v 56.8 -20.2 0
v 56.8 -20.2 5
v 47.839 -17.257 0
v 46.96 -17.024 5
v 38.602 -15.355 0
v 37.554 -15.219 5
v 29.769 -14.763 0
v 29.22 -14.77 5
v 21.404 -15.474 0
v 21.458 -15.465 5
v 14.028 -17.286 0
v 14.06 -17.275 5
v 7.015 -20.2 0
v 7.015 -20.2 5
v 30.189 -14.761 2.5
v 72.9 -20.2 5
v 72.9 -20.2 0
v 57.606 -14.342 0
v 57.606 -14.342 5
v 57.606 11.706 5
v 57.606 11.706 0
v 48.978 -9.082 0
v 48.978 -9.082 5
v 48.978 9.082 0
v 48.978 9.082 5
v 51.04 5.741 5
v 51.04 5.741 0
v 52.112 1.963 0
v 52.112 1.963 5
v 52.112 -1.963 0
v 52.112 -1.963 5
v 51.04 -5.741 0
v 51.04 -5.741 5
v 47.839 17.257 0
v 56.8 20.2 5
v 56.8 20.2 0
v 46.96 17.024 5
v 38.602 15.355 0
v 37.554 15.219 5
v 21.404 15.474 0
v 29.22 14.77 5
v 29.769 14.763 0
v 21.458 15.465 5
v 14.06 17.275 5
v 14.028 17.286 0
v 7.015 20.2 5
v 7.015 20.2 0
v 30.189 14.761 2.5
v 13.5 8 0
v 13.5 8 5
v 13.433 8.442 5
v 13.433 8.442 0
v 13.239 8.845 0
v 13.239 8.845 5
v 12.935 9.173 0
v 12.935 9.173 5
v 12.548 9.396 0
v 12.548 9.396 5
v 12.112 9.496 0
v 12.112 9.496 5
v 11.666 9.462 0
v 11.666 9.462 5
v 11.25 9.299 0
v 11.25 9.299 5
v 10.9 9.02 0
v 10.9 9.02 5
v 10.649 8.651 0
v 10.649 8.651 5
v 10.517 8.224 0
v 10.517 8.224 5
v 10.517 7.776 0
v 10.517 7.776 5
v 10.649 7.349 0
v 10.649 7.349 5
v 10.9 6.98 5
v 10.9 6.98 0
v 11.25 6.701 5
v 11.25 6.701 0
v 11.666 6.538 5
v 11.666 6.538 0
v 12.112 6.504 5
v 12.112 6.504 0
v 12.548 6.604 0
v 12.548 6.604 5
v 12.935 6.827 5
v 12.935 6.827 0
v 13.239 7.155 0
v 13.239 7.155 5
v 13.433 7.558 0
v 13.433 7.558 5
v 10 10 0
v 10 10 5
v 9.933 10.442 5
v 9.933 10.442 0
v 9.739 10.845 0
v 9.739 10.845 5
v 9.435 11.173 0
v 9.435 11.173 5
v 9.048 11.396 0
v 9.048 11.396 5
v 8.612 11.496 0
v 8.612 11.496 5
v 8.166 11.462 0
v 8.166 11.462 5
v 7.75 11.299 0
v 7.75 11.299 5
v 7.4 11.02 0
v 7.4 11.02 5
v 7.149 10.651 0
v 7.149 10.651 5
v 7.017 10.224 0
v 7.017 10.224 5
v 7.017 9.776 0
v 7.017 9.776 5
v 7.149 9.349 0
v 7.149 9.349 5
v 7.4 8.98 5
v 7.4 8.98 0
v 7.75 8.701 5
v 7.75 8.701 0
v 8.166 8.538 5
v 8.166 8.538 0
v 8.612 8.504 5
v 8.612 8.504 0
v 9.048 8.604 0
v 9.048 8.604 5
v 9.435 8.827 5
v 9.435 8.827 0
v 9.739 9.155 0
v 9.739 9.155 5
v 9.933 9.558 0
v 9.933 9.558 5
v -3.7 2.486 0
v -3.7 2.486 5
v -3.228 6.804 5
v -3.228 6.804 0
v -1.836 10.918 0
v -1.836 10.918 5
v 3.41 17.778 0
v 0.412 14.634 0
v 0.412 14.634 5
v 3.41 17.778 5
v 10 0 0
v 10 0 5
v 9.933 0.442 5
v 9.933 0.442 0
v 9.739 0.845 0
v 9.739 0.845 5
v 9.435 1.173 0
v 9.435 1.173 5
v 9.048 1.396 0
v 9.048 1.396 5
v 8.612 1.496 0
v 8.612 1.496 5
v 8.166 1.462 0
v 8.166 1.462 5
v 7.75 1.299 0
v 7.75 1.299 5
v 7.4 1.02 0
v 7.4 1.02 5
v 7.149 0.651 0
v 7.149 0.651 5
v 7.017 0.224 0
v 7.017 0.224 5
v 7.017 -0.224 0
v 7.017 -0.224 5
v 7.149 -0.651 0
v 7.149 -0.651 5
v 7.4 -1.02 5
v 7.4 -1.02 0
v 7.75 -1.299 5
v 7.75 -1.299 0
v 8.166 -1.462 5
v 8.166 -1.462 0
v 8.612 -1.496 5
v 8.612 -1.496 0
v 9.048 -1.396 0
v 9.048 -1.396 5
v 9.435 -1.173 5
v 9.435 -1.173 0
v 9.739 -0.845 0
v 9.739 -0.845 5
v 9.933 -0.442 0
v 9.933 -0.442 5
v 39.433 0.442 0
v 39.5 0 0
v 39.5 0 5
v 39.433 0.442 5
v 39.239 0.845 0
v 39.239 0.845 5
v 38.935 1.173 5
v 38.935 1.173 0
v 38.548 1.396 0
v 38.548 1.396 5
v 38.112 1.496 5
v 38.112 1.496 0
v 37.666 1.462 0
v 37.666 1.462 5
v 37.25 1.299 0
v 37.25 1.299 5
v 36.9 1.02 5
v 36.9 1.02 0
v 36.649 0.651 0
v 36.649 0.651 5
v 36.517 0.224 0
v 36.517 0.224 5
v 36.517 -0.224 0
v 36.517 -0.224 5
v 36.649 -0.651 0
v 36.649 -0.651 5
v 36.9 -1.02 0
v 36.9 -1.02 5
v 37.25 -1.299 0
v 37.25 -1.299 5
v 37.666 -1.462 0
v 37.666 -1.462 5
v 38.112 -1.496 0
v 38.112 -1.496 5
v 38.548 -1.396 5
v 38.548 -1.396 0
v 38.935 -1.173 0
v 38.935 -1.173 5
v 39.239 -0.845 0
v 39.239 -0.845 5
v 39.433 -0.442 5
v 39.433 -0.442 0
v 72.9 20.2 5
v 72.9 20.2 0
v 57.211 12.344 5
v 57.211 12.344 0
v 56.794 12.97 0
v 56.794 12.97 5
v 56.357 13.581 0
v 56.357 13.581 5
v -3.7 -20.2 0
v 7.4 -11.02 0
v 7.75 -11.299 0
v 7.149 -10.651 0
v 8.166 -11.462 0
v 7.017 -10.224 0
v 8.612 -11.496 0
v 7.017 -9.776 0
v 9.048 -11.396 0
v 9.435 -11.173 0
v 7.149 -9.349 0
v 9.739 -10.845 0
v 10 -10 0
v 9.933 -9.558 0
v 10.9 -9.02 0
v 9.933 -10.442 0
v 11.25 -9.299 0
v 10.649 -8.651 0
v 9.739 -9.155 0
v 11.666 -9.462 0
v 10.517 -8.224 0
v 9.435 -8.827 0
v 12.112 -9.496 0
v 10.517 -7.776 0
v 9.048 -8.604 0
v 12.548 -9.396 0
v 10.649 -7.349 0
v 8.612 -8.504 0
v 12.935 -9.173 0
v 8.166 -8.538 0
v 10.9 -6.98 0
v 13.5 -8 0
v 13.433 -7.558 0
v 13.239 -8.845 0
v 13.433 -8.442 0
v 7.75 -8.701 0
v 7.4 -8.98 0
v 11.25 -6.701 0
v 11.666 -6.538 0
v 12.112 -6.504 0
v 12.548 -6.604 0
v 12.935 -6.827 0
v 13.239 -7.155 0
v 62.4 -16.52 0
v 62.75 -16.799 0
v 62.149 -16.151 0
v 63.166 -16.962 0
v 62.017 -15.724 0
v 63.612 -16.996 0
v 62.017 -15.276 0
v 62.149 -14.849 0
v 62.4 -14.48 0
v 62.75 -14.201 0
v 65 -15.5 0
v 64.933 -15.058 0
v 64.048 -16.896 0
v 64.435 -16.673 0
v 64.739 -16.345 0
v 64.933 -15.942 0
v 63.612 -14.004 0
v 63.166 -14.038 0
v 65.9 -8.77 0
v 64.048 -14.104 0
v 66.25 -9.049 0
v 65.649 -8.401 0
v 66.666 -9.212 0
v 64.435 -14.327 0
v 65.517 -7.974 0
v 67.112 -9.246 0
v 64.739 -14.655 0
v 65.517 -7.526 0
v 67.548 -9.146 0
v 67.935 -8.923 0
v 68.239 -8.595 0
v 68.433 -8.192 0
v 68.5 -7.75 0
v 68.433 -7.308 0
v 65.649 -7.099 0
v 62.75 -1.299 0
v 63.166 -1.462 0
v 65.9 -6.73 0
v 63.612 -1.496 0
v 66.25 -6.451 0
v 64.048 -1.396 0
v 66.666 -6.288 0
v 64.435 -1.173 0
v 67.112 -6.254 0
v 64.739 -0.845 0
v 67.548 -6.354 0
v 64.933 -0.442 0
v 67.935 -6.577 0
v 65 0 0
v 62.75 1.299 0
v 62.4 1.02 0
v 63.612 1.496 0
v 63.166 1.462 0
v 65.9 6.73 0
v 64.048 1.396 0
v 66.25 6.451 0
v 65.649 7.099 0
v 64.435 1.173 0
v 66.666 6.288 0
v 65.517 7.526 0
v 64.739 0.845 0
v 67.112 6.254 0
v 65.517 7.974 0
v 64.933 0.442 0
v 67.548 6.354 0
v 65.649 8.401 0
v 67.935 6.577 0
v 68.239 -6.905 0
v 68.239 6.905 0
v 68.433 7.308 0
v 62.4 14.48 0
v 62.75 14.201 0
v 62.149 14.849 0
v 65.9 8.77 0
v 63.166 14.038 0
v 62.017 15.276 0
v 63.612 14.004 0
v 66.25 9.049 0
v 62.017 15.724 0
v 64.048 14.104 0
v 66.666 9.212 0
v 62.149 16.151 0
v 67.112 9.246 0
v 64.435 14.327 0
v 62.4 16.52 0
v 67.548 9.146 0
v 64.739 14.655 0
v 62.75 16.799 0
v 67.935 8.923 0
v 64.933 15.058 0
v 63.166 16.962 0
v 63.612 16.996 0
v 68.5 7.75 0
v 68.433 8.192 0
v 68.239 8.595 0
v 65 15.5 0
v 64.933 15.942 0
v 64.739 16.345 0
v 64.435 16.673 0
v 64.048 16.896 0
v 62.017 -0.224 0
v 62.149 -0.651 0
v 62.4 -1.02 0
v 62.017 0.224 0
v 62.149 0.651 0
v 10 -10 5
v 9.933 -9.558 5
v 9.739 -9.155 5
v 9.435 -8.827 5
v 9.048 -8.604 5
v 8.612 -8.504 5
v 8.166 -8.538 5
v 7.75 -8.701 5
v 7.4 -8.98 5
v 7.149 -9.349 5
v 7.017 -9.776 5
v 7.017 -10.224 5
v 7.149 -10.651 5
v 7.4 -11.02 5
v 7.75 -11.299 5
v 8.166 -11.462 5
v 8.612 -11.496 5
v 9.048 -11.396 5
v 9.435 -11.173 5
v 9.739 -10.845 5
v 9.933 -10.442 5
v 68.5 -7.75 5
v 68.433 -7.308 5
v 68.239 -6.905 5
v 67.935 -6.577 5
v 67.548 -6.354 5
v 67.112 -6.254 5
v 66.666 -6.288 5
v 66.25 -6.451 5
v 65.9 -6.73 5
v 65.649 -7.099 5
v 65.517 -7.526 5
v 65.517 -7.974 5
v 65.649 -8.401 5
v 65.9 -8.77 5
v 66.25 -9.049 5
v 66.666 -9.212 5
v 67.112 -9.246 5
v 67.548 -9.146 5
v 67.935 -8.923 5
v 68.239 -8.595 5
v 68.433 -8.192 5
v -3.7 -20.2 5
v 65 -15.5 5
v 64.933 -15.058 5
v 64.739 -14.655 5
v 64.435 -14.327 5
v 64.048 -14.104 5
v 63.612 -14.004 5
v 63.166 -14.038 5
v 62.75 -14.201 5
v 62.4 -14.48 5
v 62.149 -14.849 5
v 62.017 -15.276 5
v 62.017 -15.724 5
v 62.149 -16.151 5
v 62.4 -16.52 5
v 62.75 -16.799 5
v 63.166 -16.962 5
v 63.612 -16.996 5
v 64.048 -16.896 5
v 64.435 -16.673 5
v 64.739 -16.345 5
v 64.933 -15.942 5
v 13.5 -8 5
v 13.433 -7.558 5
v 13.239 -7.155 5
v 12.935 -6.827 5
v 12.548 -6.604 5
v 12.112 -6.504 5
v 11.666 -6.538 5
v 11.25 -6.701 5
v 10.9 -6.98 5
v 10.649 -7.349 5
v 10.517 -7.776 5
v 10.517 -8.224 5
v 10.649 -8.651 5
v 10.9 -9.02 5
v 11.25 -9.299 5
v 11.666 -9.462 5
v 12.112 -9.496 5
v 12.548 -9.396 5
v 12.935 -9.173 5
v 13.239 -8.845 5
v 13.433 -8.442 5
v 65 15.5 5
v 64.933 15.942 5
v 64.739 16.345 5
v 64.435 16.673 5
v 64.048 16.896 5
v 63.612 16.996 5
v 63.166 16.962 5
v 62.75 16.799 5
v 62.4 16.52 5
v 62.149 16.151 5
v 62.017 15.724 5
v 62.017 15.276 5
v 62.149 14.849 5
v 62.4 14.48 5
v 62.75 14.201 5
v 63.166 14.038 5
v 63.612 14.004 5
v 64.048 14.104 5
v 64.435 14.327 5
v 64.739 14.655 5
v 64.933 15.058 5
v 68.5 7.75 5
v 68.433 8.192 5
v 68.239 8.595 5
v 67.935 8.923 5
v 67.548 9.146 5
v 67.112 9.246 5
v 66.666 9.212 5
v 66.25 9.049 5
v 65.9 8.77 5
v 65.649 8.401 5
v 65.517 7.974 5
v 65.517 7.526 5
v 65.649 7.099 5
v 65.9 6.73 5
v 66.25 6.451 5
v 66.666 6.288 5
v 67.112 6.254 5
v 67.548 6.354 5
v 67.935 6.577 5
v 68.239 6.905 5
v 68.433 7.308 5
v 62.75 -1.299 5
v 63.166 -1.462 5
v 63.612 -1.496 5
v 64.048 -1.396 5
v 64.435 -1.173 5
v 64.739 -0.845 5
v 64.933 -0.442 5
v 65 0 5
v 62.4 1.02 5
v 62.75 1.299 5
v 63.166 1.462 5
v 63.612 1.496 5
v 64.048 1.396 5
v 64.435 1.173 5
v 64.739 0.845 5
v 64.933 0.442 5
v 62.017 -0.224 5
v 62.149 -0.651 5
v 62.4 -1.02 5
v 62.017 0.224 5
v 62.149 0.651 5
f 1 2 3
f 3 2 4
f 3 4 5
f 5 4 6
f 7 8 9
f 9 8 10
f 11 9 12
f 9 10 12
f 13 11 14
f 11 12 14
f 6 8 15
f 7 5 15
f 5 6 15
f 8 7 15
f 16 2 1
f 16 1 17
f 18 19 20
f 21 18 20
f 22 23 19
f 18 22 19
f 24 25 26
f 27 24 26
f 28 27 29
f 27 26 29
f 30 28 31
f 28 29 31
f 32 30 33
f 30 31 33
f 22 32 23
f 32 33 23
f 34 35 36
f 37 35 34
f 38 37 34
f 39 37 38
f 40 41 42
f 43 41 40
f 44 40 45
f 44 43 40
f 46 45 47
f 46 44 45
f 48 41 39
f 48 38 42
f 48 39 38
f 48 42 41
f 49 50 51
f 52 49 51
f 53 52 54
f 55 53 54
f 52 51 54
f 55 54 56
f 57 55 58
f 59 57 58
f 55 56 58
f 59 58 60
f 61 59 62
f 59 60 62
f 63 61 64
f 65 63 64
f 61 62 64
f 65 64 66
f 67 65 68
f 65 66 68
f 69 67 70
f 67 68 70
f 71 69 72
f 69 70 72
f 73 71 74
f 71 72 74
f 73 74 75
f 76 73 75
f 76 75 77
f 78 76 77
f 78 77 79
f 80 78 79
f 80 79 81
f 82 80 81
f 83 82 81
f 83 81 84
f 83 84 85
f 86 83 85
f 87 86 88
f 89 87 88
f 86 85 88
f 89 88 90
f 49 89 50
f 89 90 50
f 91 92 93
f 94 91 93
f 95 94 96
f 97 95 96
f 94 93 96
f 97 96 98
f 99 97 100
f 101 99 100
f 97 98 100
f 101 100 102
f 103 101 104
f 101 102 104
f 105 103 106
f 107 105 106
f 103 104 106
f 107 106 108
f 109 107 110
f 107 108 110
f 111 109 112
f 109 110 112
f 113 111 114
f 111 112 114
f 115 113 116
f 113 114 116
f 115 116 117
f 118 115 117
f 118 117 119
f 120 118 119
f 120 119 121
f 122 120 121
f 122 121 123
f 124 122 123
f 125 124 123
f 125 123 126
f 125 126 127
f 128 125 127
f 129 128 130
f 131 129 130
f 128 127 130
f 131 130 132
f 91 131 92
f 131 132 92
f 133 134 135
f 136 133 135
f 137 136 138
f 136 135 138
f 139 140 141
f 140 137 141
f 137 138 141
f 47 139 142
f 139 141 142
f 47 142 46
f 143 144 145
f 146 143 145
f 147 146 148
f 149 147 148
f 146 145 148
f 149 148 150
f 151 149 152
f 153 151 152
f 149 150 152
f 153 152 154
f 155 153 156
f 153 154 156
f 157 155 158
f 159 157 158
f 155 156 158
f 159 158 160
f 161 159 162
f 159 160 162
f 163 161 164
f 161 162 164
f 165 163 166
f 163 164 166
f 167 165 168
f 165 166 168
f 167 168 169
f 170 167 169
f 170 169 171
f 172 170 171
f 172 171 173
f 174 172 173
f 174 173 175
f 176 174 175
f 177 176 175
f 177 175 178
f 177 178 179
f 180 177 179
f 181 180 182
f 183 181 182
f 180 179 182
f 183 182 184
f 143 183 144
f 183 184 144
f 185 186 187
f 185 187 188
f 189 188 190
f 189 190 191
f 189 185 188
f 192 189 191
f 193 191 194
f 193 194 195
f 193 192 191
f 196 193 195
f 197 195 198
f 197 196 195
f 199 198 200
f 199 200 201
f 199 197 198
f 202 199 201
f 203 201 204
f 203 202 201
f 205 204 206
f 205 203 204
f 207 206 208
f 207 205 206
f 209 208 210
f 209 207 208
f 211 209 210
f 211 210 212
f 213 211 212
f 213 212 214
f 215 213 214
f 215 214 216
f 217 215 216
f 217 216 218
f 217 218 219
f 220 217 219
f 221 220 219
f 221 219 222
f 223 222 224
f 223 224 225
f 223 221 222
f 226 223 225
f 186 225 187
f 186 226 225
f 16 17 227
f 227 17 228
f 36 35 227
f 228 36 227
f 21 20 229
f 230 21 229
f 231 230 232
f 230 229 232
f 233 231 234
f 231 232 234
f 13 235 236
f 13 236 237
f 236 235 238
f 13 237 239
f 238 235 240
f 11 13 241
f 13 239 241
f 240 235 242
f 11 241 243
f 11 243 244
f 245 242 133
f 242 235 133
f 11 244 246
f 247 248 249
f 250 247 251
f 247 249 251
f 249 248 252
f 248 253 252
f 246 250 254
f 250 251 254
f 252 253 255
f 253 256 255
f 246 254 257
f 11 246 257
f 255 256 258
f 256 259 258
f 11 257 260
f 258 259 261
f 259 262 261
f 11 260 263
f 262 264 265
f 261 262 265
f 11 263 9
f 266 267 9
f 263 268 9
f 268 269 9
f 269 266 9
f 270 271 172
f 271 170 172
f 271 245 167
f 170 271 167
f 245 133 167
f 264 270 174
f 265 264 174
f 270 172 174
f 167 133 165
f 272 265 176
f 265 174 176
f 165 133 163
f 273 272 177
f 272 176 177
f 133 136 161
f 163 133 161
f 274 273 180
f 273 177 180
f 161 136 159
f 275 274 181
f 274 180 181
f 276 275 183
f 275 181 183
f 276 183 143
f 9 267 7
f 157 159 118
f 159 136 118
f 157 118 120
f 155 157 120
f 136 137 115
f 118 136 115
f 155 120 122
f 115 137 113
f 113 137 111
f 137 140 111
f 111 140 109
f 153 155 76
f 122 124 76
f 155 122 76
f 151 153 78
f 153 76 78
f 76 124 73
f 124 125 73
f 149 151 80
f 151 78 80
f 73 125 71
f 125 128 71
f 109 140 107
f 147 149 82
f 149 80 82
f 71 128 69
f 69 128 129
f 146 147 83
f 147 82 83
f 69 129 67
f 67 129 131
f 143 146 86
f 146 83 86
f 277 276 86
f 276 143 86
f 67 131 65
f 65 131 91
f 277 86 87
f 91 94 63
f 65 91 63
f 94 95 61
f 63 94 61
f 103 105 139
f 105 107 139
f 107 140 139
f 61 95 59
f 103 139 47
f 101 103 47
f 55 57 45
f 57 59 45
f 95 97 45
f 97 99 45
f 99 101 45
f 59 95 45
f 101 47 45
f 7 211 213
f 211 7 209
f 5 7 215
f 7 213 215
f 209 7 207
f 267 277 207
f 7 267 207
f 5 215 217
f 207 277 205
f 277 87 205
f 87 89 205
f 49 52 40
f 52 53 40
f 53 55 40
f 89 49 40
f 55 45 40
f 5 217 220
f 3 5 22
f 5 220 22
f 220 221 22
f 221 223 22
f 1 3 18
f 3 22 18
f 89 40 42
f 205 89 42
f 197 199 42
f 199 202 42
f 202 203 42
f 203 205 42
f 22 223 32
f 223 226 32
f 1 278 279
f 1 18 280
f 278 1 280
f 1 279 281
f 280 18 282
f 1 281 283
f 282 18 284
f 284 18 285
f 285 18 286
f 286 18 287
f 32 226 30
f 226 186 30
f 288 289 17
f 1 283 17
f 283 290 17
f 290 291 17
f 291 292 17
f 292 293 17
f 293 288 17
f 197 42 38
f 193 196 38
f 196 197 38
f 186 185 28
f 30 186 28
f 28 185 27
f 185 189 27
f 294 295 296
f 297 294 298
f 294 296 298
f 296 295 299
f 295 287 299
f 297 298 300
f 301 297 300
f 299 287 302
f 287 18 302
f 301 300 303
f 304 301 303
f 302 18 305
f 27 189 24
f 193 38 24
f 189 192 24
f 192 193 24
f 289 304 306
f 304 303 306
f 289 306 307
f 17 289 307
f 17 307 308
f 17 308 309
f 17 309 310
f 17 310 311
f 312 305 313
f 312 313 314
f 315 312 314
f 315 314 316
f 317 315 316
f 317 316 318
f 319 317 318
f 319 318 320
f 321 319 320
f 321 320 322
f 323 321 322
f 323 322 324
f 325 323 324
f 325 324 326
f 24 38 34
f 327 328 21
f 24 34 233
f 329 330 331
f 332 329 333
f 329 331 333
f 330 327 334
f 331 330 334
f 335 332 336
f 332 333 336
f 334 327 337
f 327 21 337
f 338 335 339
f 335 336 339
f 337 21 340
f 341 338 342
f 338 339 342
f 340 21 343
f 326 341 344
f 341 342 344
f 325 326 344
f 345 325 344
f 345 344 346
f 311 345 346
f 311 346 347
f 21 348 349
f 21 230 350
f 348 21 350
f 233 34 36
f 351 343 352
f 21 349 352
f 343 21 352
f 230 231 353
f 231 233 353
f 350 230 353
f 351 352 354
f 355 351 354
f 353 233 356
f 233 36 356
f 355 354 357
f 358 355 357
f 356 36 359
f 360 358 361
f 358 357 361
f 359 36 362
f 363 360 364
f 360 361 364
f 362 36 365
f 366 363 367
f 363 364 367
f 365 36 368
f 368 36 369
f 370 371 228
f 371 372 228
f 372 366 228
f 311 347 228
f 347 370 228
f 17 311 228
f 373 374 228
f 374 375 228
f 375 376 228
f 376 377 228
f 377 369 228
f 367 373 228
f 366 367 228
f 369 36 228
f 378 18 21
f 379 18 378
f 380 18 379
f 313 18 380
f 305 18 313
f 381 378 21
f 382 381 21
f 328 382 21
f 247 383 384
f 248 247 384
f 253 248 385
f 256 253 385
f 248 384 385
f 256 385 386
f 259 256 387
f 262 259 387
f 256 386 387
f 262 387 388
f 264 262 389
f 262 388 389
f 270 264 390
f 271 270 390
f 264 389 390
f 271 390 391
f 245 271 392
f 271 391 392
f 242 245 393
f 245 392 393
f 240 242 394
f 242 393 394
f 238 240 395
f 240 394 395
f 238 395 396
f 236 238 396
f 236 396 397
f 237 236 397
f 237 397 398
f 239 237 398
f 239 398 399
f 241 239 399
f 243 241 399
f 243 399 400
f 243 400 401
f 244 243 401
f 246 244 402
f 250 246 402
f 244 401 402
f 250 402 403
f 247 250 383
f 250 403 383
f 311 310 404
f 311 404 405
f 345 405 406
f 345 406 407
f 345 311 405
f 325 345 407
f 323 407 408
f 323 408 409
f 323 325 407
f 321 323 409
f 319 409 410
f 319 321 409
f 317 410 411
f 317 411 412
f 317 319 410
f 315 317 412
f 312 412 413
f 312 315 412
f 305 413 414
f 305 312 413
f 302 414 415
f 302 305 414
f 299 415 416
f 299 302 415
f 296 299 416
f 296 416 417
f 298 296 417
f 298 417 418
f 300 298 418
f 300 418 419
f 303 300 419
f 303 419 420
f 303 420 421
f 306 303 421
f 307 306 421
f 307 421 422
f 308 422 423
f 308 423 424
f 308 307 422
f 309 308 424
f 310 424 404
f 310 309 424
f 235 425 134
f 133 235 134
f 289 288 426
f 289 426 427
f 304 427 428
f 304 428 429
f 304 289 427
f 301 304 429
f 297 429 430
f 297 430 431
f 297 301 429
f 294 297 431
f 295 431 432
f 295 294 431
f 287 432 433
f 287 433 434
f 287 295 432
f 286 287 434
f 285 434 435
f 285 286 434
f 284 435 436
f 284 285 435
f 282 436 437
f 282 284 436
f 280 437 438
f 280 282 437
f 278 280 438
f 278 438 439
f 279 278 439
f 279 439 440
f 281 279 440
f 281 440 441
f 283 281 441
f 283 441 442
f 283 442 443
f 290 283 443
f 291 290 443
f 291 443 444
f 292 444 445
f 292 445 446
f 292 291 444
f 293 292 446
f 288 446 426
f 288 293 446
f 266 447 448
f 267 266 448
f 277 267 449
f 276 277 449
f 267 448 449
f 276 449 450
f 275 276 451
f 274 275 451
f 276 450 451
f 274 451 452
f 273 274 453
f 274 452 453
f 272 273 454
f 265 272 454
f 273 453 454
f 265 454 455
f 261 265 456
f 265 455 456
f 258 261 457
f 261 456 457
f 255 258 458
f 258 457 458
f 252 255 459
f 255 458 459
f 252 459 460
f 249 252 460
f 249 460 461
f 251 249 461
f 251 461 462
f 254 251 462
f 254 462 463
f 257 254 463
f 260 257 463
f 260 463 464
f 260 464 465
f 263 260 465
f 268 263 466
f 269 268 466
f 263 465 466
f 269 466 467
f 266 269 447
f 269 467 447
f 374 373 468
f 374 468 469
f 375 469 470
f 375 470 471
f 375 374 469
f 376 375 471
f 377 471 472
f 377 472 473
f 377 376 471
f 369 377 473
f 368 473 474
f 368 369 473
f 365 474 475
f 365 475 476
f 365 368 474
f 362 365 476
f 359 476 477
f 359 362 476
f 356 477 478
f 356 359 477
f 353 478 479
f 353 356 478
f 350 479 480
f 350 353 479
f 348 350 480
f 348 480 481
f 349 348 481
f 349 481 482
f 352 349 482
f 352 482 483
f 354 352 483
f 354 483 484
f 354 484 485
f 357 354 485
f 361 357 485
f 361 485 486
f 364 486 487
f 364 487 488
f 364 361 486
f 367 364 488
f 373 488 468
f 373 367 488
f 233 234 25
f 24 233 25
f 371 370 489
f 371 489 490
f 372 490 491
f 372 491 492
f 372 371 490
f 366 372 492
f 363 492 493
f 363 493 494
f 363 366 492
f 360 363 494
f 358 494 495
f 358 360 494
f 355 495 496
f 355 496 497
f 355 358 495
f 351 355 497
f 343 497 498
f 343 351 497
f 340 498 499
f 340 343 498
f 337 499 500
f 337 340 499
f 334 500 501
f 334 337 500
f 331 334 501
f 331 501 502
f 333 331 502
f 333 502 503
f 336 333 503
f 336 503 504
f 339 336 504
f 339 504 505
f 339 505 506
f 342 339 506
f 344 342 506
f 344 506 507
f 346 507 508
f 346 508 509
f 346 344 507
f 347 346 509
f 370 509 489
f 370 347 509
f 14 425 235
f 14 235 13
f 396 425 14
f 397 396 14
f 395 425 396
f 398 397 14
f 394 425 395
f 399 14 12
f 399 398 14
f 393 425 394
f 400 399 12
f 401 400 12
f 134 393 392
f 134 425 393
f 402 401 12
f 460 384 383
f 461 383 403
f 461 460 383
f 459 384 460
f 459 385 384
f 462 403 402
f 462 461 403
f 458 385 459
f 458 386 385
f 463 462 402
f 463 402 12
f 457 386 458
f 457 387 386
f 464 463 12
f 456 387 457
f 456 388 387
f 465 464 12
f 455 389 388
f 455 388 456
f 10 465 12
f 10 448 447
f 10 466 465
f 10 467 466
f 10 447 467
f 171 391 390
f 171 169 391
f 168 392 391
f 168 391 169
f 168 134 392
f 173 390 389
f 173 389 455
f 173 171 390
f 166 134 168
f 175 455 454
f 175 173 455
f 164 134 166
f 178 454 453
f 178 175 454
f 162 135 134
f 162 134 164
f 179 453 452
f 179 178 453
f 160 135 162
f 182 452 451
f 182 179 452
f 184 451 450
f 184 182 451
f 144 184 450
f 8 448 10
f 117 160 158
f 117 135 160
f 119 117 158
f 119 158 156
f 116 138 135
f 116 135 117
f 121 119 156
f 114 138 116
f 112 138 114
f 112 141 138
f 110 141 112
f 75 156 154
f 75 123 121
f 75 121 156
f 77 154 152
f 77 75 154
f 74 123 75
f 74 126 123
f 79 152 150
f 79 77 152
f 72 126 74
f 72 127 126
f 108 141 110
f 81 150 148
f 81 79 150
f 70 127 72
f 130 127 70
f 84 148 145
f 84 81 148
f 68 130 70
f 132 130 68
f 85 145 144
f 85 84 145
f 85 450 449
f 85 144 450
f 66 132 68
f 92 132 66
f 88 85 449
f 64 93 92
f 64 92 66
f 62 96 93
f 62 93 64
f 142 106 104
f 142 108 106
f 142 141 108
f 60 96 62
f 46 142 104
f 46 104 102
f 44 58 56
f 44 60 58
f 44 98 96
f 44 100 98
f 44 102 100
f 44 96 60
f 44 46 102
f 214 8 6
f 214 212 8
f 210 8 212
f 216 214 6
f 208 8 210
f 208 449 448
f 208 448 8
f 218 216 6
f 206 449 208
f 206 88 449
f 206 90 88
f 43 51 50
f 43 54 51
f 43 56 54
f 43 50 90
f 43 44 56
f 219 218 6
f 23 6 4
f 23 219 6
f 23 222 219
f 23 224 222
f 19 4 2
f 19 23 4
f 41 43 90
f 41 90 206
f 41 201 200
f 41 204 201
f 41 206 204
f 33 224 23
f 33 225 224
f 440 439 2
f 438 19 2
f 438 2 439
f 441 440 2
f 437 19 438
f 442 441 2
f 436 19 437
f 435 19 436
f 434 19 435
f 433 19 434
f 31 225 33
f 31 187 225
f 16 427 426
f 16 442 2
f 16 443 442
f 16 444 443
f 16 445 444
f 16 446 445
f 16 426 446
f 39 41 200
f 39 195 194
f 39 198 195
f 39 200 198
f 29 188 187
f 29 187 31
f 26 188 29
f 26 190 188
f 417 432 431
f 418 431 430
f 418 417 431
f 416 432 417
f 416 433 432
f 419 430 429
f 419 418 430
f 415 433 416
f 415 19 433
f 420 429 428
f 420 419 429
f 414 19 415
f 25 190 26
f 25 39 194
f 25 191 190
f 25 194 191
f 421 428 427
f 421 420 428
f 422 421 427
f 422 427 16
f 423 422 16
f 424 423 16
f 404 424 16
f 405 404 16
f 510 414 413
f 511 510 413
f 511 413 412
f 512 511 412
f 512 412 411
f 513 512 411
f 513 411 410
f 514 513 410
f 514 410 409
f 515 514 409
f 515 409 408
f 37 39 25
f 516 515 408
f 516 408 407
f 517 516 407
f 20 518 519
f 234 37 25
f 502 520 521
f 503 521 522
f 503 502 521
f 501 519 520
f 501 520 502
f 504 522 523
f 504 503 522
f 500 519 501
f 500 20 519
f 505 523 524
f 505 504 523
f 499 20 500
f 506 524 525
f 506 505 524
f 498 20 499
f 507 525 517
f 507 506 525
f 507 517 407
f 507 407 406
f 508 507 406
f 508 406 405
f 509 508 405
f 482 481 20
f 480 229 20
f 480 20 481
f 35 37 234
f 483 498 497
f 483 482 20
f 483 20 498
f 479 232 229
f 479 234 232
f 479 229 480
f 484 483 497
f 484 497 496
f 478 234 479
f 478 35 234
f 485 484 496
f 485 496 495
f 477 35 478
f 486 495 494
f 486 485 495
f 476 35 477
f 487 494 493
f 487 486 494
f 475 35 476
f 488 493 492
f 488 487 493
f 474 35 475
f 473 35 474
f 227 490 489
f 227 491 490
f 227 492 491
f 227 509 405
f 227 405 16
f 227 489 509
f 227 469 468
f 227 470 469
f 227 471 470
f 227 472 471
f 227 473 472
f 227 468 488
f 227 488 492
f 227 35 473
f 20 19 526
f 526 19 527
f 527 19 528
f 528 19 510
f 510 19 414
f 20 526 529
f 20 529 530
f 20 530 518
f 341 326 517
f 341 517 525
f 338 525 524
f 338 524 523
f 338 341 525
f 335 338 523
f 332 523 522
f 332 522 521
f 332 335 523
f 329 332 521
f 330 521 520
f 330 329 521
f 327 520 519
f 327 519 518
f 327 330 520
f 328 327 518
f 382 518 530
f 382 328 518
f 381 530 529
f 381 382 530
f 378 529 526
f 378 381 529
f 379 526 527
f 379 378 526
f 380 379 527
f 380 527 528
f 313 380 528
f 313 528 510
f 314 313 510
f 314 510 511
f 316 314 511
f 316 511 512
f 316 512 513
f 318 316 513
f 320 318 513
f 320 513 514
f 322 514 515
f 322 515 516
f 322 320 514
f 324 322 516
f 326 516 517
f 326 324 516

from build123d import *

# Parameters (mm, degrees)
CROQUIS1_W              = 41.4
CROQUIS1_H              = 40.4
CROQUIS1_R              = 1.5
SALIENTE_EXTRUIR1_DEPTH = 5
CROQUIS3_W              = 35.2
CROQUIS3_H              = 40.4
CROQUIS3_R              = 1.5
SALIENTE_EXTRUIR3_DEPTH = 5
CORTAR_EXTRUIR1_REACH   = 77.812
REDONDEO1_R             = 20
CORTAR_EXTRUIR2_REACH   = 77.812


with BuildPart() as part:
    # Croquis1 → Saliente-Extruir1 (new body)
    with BuildSketch(Plane.XY):
        with Locations((52.2, 0)):
            Rectangle(CROQUIS1_W, CROQUIS1_H)
        with Locations((63.5, 0)):
            Circle(CROQUIS1_R, mode=Mode.SUBTRACT)
        with Locations((63.5, -15.5)):
            Circle(CROQUIS1_R, mode=Mode.SUBTRACT)
        with Locations((38, 0)):
            Circle(CROQUIS1_R, mode=Mode.SUBTRACT)
        with Locations((63.5, 15.5)):
            Circle(CROQUIS1_R, mode=Mode.SUBTRACT)
        with Locations((67, -7.75)):
            Circle(CROQUIS1_R, mode=Mode.SUBTRACT)
        with Locations((67, 7.75)):
            Circle(CROQUIS1_R, mode=Mode.SUBTRACT)
    extrude(amount=SALIENTE_EXTRUIR1_DEPTH)

    # Croquis3 → Saliente-Extruir3 (add)
    with BuildSketch(Plane.XY.offset(5)):
        with Locations((13.9, 0)):
            Rectangle(CROQUIS3_W, CROQUIS3_H)
        with Locations((8.5, 0)):
            Circle(CROQUIS3_R, mode=Mode.SUBTRACT)
        with Locations((8.5, -10)):
            Circle(CROQUIS3_R, mode=Mode.SUBTRACT)
        with Locations((8.5, 10)):
            Circle(CROQUIS3_R, mode=Mode.SUBTRACT)
        with Locations((12, 8)):
            Circle(CROQUIS3_R, mode=Mode.SUBTRACT)
        with Locations((12, -8)):
            Circle(CROQUIS3_R, mode=Mode.SUBTRACT)
    extrude(amount=-SALIENTE_EXTRUIR3_DEPTH)

    # Croquis5 → Cortar-Extruir1 (cut, up to next)
    with BuildSketch(Plane.XY.offset(5), mode=Mode.PRIVATE) as cortar_extruir1_sk1:
        with BuildLine():
            Line((7.014997686, 20.2), (56.8, 20.2))
            add(Edge.make_bspline(
                [(56.8, 20.2), (28.469554023, 9.322898051), (7.014997686, 20.2)],
                knots=[0, 0, 0, 0.793600416, 0.793600416, 0.793600416], degree=2))
        make_face()
    cortar_extruir1_tool1 = extrude(cortar_extruir1_sk1.sketch, amount=-CORTAR_EXTRUIR1_REACH, mode=Mode.PRIVATE) & part.part
    cortar_extruir1 = cortar_extruir1_tool1.solids().sort_by_distance((31.21991, 18.02458, 5))[0]
    add(cortar_extruir1, mode=Mode.SUBTRACT)

    # Simetría1: Cortar-Extruir1 across plane
    add(cortar_extruir1.mirror(Plane.ZX), mode=Mode.SUBTRACT)

    # Redondeo1
    # the kernel refuses this fillet: 20 mm, written as the material it takes off along each edge
    with BuildSketch(Plane(origin=(-3.7, 20.2, 49.285207182), x_dir=(1, 0, 0), z_dir=(0, 0, -1))) as redondeo1_piece_1:
        with BuildLine():
            CenterArc((20, 17.714082873), REDONDEO1_R, 180, 62.338298383)
            Line((0, 17.714082873), (-0.4, 17.714082873))
            Line((-0.4, 17.714082873), (-0.4, 0))
            Line((-0.4, 0), (0, -0.4))
            ThreePointArc((0, -0.4), (5.357498843, -0.4), (10.52929764, -0.354281657))
            Line((10.52929764, -0.354281657), (10.714997686, 0))
        make_face()
    extrude(amount=93.570414364, mode=Mode.SUBTRACT)

    # Croquis6 → Cortar-Extruir2 (cut, up to next)
    with BuildSketch(Plane.XY.offset(5), mode=Mode.PRIVATE) as cortar_extruir2_sk1:
        with BuildLine():
            ThreePointArc((57.606275, 11.70586502), (57.004955729, 12.658789554), (56.35736085, 13.580890908))
            Line((56.35736085, 13.580890908), (48.977815911, 9.082196509))
            ThreePointArc((48.977815911, 9.082196509), (52.247762477, 0), (48.977815911, -9.082196509))
            Line((48.977815911, -9.082196509), (57.606275, -14.342249927))
            Line((57.606275, -14.342249927), (57.606275, 11.70586502))
        make_face()
    cortar_extruir2_tool1 = extrude(cortar_extruir2_sk1.sketch, amount=-CORTAR_EXTRUIR2_REACH, mode=Mode.PRIVATE) & part.part
    add(cortar_extruir2_tool1.solids().sort_by_distance((54.420947, -0.132696, 5))[0], mode=Mode.SUBTRACT)


solid = part.part
